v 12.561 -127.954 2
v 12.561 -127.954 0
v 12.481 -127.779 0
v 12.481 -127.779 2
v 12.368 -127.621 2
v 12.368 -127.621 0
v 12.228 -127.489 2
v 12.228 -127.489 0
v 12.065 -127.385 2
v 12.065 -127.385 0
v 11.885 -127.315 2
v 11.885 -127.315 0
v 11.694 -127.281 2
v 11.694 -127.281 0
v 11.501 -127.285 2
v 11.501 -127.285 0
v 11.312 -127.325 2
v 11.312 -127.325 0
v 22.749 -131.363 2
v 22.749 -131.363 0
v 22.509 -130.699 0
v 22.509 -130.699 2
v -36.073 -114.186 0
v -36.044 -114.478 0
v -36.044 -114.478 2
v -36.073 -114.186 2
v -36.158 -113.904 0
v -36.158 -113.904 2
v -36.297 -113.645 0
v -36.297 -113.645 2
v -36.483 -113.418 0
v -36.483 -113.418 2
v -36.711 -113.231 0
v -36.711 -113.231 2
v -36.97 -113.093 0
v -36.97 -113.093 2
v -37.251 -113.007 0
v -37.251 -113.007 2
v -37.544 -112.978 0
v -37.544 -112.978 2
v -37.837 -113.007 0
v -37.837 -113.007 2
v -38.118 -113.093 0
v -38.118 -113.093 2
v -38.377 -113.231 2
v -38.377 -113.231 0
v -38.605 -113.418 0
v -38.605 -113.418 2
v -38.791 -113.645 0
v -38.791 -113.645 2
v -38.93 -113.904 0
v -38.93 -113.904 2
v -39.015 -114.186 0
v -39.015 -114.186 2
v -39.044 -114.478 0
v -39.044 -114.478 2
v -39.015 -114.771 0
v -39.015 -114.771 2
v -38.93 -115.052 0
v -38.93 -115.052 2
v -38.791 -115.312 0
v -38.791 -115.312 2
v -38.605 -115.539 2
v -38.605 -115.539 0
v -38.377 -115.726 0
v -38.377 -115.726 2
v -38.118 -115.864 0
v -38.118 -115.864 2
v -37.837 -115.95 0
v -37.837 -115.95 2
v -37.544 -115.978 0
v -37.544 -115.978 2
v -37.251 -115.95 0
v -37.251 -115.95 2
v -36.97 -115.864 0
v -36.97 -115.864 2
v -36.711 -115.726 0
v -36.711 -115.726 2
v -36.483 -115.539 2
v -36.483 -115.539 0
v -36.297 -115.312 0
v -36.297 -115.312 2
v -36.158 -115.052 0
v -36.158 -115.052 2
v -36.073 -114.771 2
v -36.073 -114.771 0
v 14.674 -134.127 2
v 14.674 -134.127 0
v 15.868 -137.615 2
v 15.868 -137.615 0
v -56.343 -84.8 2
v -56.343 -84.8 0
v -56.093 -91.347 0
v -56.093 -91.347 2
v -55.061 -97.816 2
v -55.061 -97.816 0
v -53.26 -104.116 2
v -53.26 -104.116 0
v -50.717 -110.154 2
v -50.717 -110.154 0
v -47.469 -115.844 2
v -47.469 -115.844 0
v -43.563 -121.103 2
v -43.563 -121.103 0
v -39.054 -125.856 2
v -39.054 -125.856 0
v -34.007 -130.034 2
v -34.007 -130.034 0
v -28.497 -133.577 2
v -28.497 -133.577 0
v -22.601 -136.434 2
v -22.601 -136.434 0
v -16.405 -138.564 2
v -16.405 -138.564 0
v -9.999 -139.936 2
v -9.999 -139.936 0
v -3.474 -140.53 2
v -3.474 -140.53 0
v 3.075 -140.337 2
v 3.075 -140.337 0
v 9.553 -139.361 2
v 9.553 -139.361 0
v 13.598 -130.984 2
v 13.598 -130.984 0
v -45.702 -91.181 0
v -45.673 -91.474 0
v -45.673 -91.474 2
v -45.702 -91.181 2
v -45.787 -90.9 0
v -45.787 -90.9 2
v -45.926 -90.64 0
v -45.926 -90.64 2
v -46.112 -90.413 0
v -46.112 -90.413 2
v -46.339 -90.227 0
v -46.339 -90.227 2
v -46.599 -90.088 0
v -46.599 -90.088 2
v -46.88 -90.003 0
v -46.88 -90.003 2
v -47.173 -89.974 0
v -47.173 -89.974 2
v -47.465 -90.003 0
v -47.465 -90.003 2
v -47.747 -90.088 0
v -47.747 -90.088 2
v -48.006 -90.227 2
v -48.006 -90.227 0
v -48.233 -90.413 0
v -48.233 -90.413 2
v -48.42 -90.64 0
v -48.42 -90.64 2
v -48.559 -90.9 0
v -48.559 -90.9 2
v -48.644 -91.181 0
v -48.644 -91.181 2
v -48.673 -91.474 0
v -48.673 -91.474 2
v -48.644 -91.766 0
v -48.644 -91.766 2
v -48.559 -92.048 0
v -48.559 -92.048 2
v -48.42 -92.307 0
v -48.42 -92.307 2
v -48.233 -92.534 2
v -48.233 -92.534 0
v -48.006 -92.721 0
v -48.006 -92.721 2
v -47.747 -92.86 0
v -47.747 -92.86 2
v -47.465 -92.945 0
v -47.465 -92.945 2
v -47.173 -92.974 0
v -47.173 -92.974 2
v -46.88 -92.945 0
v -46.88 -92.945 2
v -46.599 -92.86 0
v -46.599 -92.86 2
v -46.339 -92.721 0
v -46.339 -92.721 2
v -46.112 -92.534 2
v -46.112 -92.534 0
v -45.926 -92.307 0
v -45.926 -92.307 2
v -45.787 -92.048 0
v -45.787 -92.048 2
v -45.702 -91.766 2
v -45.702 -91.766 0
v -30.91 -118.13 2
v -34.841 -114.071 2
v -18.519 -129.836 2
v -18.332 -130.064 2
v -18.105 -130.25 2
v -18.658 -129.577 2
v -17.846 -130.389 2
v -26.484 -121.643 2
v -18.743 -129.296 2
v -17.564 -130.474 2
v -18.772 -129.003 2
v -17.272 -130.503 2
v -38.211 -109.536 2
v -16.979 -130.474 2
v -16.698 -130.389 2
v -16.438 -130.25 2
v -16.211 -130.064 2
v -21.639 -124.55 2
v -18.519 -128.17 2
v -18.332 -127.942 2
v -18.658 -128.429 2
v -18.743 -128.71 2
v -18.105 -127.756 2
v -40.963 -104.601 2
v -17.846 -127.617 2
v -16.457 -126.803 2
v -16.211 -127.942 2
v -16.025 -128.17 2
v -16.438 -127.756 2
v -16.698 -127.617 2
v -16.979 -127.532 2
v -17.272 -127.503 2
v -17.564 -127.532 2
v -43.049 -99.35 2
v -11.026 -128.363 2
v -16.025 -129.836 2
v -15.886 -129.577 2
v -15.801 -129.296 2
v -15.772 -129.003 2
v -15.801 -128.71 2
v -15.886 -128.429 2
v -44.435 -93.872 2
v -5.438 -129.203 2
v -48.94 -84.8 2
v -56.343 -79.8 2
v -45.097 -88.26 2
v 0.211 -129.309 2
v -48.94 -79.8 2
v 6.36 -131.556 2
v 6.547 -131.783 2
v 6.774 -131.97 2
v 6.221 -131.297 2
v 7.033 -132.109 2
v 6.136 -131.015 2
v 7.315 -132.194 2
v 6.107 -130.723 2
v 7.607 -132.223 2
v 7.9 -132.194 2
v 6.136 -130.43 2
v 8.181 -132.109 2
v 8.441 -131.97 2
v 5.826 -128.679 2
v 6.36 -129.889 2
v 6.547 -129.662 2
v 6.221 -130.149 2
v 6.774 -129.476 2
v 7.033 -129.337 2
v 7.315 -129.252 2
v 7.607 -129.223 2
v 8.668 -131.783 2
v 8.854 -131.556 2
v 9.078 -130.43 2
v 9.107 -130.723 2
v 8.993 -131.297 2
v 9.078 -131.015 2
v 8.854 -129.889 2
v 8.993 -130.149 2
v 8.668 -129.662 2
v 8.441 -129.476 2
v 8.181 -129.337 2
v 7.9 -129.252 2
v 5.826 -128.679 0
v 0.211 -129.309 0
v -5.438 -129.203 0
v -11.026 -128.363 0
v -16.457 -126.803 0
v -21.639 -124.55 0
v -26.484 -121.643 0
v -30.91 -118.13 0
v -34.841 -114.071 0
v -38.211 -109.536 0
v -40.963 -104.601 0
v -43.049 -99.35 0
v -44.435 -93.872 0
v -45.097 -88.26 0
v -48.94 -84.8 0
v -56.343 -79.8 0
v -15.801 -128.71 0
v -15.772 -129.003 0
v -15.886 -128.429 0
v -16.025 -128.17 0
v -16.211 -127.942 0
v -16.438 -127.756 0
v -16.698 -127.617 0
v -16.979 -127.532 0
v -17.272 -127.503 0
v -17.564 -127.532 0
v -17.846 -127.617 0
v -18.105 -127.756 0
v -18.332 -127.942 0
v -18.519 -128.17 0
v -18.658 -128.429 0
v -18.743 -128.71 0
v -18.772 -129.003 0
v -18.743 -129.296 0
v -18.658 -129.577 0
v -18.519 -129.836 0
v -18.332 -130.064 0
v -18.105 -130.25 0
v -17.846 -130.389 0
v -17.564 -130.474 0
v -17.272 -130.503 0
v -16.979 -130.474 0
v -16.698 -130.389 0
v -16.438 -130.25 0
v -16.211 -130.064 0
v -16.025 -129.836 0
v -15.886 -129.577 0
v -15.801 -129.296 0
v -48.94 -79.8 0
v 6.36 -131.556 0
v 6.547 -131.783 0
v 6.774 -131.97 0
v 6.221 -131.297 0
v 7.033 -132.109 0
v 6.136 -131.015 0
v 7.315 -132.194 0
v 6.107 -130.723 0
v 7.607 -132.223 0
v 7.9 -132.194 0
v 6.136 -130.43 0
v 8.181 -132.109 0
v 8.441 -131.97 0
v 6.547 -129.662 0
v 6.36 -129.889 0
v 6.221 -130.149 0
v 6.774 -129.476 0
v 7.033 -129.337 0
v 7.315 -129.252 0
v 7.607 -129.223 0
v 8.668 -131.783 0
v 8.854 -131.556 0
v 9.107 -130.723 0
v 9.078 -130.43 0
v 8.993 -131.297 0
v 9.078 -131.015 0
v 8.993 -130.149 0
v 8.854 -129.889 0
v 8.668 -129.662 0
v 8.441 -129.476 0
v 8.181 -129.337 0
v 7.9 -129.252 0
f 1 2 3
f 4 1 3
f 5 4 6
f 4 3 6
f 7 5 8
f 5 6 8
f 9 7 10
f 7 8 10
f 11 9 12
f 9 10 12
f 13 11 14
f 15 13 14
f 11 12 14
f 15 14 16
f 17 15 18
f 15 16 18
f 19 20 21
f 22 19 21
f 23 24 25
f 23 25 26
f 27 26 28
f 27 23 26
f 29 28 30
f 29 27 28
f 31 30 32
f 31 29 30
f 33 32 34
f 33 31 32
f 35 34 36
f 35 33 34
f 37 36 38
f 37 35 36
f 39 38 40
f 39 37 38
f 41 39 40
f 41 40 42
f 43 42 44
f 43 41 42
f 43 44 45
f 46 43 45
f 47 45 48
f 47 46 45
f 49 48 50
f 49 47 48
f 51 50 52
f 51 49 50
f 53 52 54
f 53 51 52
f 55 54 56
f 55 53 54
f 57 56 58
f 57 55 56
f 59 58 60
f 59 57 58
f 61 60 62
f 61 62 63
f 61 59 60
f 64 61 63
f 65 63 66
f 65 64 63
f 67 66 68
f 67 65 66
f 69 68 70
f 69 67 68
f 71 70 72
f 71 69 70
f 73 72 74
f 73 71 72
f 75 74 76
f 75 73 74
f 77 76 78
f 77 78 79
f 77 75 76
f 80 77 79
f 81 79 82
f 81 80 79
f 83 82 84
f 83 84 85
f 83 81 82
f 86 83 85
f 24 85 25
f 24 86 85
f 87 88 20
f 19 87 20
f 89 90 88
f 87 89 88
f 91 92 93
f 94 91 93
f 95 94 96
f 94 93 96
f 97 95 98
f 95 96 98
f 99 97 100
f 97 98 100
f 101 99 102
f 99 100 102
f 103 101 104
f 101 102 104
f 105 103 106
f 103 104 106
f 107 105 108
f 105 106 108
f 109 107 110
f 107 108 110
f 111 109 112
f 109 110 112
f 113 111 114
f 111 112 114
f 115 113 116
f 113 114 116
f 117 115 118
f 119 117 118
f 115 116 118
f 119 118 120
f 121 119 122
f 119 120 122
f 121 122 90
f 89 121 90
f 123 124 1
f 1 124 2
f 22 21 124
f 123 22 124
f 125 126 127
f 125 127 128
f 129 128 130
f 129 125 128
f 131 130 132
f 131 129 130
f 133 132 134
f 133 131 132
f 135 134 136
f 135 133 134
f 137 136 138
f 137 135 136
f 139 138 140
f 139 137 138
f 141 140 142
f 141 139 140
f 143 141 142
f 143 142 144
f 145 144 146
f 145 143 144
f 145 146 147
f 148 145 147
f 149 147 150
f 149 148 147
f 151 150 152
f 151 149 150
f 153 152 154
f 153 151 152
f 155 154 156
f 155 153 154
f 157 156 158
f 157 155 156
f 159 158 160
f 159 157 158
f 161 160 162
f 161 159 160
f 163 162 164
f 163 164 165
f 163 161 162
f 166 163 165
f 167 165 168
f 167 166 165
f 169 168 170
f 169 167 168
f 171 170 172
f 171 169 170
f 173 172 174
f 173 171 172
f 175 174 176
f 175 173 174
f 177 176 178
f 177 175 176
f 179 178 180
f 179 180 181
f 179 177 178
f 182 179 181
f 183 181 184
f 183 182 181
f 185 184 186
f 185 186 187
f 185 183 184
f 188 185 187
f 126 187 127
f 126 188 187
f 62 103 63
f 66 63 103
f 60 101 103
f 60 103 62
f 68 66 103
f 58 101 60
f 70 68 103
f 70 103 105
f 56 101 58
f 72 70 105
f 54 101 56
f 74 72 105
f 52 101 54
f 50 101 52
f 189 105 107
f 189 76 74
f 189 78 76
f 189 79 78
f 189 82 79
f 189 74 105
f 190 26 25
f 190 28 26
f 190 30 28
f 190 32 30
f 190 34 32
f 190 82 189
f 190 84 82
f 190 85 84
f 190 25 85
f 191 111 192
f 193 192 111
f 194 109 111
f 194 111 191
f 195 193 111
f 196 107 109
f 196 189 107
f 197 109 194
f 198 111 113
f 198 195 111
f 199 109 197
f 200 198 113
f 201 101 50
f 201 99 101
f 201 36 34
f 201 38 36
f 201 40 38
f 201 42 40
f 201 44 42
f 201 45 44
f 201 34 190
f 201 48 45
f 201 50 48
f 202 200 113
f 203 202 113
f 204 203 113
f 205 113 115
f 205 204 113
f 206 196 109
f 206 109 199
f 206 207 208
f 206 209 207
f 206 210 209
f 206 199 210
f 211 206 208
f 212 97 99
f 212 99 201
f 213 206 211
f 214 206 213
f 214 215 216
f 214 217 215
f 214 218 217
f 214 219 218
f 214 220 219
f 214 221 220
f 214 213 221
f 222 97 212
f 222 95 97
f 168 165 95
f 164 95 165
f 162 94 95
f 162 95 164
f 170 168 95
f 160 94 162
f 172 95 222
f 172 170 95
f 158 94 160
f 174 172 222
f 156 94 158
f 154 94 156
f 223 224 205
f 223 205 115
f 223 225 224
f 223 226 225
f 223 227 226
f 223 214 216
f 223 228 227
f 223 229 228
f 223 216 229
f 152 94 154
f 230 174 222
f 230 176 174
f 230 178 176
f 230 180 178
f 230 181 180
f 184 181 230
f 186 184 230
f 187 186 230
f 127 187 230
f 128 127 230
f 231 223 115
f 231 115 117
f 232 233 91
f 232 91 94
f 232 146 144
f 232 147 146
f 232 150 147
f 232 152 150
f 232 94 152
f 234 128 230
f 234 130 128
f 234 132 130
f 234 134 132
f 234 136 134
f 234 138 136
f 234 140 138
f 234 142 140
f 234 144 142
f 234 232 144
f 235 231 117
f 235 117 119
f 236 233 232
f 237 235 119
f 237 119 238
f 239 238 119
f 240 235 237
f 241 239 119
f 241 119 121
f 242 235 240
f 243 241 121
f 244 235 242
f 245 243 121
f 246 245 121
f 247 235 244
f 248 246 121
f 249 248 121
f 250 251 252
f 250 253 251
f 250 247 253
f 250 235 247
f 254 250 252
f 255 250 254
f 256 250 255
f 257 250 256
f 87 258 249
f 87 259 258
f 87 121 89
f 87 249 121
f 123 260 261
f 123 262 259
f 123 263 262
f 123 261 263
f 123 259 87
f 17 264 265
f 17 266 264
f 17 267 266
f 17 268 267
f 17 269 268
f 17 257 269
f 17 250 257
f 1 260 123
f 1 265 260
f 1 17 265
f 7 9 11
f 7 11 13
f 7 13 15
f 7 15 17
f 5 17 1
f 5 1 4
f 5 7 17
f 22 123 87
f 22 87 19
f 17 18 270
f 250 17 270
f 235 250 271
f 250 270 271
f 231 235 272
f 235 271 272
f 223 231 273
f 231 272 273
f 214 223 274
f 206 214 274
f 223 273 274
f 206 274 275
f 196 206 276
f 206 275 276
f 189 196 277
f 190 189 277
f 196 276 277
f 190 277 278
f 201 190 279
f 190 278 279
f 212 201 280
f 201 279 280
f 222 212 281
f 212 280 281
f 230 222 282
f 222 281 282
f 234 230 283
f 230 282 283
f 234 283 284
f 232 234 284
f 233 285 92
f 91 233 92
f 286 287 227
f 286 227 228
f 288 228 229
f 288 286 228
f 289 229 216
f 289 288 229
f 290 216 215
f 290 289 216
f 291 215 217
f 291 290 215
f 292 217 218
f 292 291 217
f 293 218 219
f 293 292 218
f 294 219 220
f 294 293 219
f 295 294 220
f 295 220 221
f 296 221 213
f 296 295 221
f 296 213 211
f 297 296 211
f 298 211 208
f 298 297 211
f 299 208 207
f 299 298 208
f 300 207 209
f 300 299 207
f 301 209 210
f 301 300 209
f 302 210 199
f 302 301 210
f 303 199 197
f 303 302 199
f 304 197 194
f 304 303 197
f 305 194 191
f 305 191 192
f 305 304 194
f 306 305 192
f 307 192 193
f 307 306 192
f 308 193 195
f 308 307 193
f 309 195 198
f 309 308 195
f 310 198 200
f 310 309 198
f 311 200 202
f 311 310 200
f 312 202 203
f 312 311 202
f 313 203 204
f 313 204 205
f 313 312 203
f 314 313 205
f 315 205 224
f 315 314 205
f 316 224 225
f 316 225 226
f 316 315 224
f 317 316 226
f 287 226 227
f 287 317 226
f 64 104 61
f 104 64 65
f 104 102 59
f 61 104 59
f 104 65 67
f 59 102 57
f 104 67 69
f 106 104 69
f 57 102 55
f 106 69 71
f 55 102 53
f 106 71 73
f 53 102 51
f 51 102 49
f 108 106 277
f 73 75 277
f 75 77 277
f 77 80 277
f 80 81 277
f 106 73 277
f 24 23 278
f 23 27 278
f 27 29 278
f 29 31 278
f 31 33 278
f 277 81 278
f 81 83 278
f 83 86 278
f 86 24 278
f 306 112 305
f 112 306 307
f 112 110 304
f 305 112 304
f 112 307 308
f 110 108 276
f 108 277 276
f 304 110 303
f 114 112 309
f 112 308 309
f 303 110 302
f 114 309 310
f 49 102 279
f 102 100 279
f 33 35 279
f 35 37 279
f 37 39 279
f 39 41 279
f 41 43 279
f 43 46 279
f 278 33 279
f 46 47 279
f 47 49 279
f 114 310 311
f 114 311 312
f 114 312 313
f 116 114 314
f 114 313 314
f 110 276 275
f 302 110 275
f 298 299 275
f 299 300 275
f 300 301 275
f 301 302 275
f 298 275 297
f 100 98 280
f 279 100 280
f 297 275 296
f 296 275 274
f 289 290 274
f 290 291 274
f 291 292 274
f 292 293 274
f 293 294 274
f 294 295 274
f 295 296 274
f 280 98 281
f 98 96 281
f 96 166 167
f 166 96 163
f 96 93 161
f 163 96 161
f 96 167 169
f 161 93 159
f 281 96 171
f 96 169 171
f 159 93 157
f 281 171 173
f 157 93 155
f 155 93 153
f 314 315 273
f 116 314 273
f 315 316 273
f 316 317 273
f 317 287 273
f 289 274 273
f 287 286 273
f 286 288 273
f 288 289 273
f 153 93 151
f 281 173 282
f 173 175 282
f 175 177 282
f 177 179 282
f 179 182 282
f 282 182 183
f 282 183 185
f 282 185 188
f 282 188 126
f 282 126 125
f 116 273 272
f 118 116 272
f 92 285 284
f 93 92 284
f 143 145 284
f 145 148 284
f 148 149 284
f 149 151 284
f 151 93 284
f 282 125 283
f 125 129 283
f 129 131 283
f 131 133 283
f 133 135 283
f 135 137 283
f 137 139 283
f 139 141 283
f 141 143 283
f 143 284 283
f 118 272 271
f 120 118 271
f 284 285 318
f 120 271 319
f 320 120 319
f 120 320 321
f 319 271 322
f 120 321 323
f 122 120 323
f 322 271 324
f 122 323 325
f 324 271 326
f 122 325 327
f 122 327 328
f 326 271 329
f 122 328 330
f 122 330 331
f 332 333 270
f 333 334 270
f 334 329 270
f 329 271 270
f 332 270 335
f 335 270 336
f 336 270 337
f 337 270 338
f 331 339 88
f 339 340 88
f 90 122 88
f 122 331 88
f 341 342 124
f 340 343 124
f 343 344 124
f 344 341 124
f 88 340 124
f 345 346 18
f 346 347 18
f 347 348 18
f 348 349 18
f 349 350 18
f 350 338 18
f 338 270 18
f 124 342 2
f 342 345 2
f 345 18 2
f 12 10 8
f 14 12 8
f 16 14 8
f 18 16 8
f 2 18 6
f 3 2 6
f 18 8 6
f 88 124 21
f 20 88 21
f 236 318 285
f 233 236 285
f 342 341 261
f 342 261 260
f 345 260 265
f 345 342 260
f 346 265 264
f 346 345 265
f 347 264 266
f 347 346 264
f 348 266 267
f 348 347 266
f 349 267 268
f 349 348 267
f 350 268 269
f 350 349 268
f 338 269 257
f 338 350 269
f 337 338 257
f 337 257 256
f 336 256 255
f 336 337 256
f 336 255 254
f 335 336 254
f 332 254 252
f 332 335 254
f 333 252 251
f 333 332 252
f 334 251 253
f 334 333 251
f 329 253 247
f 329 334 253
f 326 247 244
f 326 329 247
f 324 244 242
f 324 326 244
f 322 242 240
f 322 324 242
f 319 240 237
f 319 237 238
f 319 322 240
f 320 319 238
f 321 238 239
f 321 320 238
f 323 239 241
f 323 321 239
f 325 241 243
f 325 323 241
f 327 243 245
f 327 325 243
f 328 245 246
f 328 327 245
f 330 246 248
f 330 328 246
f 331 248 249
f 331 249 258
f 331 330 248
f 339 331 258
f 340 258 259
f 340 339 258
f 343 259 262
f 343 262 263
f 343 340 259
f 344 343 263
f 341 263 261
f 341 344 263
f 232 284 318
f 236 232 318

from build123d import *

# Parameters (mm, degrees)
SKETCH1_R           = 1.5
BOSS_EXTRUDE1_DEPTH = 2


with BuildPart() as part:
    # Sketch1 → Boss-Extrude1 (new body)
    with BuildSketch(Plane.XY):
        with BuildLine():
            Line((22.508911342, -130.69915726), (13.597675192, -130.983785211))
            Line((13.597675192, -130.983785211), (12.560733381, -127.954436921))
            ThreePointArc((12.560733381, -127.954436921), (12.064722619, -127.385308804), (11.312186404, -127.325119655))
            ThreePointArc((11.312186404, -127.325119655), (-26.483938318, -121.642871269), (-45.096768624, -88.26027792))
            Line((-45.096768624, -88.26027792), (-48.940455795, -84.8))
            Line((-48.940455795, -84.8), (-48.940455795, -79.8))
            Line((-48.940455795, -79.8), (-56.342527733, -79.8))
            Line((-56.342527733, -79.8), (-56.342527733, -84.8))
            ThreePointArc((-56.342527733, -84.8), (-34.007319131, -130.034150274), (15.867669408, -137.615404294))
            Line((15.867669408, -137.615404294), (14.673679255, -134.127250965))
            Line((14.673679255, -134.127250965), (22.749464344, -131.362920683))
            Line((22.749464344, -131.362920683), (22.508911342, -130.69915726))
        make_face()
        with Locations((7.607262335, -130.722795016)):
            Circle(SKETCH1_R, mode=Mode.SUBTRACT)
        with Locations((-37.543895432, -114.478381178)):
            Circle(SKETCH1_R, mode=Mode.SUBTRACT)
        with Locations((-47.172740285, -91.473829097)):
            Circle(SKETCH1_R, mode=Mode.SUBTRACT)
        with Locations((-17.271773957, -129.003020951)):
            Circle(SKETCH1_R, mode=Mode.SUBTRACT)
    extrude(amount=BOSS_EXTRUDE1_DEPTH)


solid = part.part
